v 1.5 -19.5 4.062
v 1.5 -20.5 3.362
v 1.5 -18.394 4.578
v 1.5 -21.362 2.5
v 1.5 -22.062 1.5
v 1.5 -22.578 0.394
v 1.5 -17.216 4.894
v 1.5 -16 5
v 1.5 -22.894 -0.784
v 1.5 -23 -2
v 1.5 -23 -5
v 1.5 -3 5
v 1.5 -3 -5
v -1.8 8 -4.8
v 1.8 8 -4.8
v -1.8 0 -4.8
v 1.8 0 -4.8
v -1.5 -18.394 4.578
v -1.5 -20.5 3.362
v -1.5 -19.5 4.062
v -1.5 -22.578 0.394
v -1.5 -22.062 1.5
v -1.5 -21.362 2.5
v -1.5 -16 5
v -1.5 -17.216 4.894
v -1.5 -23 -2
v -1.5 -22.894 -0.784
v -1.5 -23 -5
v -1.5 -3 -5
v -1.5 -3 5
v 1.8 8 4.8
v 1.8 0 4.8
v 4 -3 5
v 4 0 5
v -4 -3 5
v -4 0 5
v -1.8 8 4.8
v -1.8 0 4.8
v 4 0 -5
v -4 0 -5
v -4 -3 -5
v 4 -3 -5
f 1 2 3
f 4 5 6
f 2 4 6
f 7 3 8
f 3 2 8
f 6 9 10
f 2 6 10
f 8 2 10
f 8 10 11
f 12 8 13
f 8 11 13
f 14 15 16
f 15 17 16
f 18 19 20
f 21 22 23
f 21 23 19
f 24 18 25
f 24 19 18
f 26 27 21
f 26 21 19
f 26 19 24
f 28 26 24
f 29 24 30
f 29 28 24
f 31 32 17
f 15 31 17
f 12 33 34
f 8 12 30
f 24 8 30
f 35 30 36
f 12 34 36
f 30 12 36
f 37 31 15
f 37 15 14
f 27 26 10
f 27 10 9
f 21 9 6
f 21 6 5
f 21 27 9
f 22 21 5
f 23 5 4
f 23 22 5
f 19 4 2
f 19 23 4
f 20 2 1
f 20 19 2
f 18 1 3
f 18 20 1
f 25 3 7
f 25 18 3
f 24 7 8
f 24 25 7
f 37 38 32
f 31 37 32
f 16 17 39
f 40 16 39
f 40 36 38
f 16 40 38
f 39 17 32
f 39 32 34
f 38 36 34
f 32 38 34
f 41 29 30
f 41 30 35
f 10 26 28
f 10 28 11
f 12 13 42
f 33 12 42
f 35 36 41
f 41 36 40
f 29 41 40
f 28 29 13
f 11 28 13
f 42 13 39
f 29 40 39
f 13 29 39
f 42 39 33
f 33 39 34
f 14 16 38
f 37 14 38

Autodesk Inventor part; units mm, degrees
ref_plane "YZ Plane" through (0, 0, 0) normal (1, 0, 0) x (0, 1, 0)
ref_plane "XZ Plane" through (0, 0, 0) normal (0, 1, 0) x (-1, 0, 0)
ref_plane "XY Plane" through (0, 0, 0) normal (0, 0, 1) x (1, 0, 0)
sketch "Sketch1" plane through (0, 0, 0) normal (0, 1, 0) x (-1, 0, 0)
  line L0 (-1.8, -4.8) -> (1.8, -4.8)
  line L1 (1.8, -4.8) -> (1.8, 4.8)
  line L2 (1.8, 4.8) -> (-1.8, 4.8)
  line L3 (-1.8, 4.8) -> (-1.8, -4.8)
  line L4 (-1.8, -4.8) -> (1.8, 4.8) construction
  line L5 (1.8, -4.8) -> (-1.8, 4.8) construction
  point P0 (0, 0)
  dimension "d0" = 3.6
  dimension "d1" = 9.6
extrude "Extrusion1" add sketch "Sketch1" along normal blind 8
sketch "Sketch2" plane through (0, 0, 0) normal (0, -1, 0) x (1, 0, 0)
  line L0 (-4, -5) -> (4, -5)
  line L1 (4, -5) -> (4, 5)
  line L2 (4, 5) -> (-4, 5)
  line L3 (-4, 5) -> (-4, -5)
  line L4 (-4, -5) -> (4, 5) construction
  line L5 (4, -5) -> (-4, 5) construction
  point P0 (0, 0)
  dimension "d4" = 8
  dimension "d5" = 10
extrude "Extrusion2" add sketch "Sketch2" along normal blind 23
fillet "Fillet1" radius 7 1 edges at (0, -23, 5)
sketch "Sketch3" plane through (4, 0, -5) normal (0, 0, -1) x (-1, 0, 0)
  line L0 (0, 0) -> (0, -16) projected
  line L1 (8, -23) -> (0, -23) projected
  line L2 (0, -3) -> (0, -23)
  line L3 (0, -23) -> (2.5, -23)
  line L4 (2.5, -23) -> (2.5, -3)
  line L5 (2.5, -3) -> (0, -3)
  line L6 (8, 0) -> (0, 0) projected
  line L7 (4, 0) -> (4, -23) construction
  line L8 (8, -3) -> (8, -23)
  line L9 (8, -23) -> (5.5, -23)
  line L10 (5.5, -23) -> (5.5, -3)
  line L11 (5.5, -3) -> (8, -3)
  point P0 (8, -16)
  dimension "d9" = 1.5
  dimension "d10" = 3
extrude "Extrusion3" cut sketch "Sketch3" against normal up to next
sketch "Sketch4" plane through (0, 8, 0) normal (0, 1, 0) x (1, 0, 0)
  line L0 (2, 5) -> (-2, 5)
  line L1 (-2, 5) -> (-2, -5)
  line L2 (-2, -5) -> (2, -5)
  line L3 (2, -5) -> (2, 5)
  line L4 (2, 5) -> (-2, -5) construction
  line L5 (-2, 5) -> (2, -5) construction
  point P0 (0, 0)
  dimension "d13" = 4
  dimension "d14" = 10
properties part number "lavalier_holder"
